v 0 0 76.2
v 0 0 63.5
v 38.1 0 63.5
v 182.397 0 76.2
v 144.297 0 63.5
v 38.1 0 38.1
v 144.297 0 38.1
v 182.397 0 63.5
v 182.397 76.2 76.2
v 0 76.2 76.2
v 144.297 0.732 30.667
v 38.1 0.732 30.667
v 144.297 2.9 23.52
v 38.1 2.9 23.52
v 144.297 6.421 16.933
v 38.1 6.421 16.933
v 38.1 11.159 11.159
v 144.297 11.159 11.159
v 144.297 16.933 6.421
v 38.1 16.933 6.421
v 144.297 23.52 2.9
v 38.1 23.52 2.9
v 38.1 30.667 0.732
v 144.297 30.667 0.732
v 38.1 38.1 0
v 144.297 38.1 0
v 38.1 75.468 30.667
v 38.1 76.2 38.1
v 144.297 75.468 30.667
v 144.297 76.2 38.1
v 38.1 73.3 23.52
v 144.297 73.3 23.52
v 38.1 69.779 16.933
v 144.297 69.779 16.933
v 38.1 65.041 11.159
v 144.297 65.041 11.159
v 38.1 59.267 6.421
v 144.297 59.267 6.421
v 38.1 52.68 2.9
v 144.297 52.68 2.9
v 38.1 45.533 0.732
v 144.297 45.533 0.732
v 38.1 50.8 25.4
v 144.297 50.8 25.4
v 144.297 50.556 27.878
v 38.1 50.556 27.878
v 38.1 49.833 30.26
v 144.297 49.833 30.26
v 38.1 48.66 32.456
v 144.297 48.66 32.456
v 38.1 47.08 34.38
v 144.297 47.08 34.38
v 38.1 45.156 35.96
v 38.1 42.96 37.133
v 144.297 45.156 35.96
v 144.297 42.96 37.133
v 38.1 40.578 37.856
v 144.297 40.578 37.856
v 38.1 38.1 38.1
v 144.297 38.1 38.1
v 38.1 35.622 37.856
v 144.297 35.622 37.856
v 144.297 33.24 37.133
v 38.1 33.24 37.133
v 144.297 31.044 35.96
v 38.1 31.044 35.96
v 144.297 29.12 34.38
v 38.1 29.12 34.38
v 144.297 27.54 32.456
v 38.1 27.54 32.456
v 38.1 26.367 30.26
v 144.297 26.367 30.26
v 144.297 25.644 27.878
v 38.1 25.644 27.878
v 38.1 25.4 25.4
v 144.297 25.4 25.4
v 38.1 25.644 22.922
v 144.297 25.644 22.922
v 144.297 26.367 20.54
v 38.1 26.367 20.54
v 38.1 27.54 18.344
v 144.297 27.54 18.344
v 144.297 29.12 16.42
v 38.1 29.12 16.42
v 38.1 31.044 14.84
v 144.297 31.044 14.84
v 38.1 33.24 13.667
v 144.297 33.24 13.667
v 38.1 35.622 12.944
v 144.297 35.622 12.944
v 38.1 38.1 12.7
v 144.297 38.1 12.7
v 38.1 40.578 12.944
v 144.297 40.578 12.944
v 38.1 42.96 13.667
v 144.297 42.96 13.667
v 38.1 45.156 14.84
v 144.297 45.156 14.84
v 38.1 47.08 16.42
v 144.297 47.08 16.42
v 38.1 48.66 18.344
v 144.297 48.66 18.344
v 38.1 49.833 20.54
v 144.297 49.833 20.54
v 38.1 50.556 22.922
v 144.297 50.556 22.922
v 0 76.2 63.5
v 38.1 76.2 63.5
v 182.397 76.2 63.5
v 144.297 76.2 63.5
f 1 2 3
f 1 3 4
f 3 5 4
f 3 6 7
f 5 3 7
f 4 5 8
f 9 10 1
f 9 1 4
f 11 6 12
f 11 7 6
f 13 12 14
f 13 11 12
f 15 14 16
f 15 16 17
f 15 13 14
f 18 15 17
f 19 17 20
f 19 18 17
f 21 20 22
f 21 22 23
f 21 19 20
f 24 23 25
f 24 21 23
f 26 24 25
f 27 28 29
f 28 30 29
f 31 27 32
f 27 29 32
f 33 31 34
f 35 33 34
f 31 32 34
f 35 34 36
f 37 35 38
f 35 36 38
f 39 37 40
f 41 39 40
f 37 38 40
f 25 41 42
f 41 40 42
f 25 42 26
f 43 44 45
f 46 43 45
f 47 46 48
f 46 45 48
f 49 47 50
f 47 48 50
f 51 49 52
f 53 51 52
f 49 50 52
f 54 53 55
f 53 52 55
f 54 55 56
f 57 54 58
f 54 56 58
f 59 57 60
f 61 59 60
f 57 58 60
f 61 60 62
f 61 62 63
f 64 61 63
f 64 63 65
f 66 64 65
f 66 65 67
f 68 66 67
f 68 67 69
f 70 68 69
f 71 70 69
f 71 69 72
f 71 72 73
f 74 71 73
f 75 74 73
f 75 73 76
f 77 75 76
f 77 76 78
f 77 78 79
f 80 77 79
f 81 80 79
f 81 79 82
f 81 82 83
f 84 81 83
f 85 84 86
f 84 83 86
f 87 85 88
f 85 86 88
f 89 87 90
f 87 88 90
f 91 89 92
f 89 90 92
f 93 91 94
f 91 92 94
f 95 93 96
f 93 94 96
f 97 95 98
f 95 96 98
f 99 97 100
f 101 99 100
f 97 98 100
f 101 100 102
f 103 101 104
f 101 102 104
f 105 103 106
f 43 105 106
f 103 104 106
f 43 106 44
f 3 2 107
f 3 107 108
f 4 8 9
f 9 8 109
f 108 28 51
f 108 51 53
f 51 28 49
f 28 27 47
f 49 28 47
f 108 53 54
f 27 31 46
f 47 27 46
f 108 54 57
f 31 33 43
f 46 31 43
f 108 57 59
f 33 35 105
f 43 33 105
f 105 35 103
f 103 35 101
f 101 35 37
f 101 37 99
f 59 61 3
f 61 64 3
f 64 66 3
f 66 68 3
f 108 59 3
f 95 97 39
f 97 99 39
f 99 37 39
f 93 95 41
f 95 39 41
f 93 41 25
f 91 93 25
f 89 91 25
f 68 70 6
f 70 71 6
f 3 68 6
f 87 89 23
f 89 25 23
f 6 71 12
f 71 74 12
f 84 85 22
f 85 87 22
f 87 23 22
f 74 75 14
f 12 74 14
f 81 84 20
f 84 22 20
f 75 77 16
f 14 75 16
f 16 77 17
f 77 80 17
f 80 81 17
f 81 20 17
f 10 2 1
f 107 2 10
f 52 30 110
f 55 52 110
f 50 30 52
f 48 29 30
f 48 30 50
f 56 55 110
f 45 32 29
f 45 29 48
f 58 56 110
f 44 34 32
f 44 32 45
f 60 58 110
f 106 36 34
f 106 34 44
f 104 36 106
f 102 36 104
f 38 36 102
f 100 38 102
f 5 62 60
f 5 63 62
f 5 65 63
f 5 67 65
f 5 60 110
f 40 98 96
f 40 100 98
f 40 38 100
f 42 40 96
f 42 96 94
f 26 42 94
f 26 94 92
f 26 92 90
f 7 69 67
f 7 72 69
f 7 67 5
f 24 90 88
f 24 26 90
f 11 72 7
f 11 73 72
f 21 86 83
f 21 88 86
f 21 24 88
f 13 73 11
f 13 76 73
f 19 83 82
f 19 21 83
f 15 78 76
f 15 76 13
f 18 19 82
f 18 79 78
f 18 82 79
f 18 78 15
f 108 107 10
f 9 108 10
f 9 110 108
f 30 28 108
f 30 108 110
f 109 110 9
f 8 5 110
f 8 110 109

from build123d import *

# Parameters (mm, degrees)
F0_W     = 182.3974
F0_H     = 76.2
F1_DEPTH = 76.2
F2_W     = 38.1
F2_H     = 76.2
F3_DEPTH = 63.5
F4_R     = 38.09999
F5_R     = 12.7
F6_DEPTH = 144.2984


# Not quite as in the source:
# - a fillet or chamfer is up to 0.001 mm smaller than in the source, because OpenCascade refuses the exact size


with BuildPart() as f1:
    # F0 (on Top) → F1 (new body)
    with BuildSketch(Plane.XY):
        with Locations((91.1987, 38.1)):
            Rectangle(F0_W, F0_H)
    extrude(amount=F1_DEPTH)

    # F2 (on face) → F3 (cut)
    with BuildSketch(Plane(origin=(0, 0, 0), x_dir=(1, 0, 0), z_dir=(0, 0, -1))):
        with Locations((163.3474, -38.1)):
            Rectangle(F2_W, F2_H)
        with Locations((19.05, -38.1)):
            Rectangle(F2_W, F2_H)
    extrude(amount=-F3_DEPTH, mode=Mode.SUBTRACT)

    # F4 (radius 38.1 in the source; OpenCascade refuses exactly that, so slightly less here)
    f4_edges = [f1.edges().sort_by_distance(p)[0] for p in [
        (91.1987, 0, 0),
        (91.1987, 76.2, 0),
    ]]
    fillet(f4_edges, radius=F4_R)

    # F5 (on face) → F6 (cut, through all)
    with BuildSketch(Plane.YZ.offset(144.2974)):
        with Locations((38.1, 25.4)):
            Circle(F5_R)
    extrude(amount=-F6_DEPTH, mode=Mode.SUBTRACT)


solid = f1.part
